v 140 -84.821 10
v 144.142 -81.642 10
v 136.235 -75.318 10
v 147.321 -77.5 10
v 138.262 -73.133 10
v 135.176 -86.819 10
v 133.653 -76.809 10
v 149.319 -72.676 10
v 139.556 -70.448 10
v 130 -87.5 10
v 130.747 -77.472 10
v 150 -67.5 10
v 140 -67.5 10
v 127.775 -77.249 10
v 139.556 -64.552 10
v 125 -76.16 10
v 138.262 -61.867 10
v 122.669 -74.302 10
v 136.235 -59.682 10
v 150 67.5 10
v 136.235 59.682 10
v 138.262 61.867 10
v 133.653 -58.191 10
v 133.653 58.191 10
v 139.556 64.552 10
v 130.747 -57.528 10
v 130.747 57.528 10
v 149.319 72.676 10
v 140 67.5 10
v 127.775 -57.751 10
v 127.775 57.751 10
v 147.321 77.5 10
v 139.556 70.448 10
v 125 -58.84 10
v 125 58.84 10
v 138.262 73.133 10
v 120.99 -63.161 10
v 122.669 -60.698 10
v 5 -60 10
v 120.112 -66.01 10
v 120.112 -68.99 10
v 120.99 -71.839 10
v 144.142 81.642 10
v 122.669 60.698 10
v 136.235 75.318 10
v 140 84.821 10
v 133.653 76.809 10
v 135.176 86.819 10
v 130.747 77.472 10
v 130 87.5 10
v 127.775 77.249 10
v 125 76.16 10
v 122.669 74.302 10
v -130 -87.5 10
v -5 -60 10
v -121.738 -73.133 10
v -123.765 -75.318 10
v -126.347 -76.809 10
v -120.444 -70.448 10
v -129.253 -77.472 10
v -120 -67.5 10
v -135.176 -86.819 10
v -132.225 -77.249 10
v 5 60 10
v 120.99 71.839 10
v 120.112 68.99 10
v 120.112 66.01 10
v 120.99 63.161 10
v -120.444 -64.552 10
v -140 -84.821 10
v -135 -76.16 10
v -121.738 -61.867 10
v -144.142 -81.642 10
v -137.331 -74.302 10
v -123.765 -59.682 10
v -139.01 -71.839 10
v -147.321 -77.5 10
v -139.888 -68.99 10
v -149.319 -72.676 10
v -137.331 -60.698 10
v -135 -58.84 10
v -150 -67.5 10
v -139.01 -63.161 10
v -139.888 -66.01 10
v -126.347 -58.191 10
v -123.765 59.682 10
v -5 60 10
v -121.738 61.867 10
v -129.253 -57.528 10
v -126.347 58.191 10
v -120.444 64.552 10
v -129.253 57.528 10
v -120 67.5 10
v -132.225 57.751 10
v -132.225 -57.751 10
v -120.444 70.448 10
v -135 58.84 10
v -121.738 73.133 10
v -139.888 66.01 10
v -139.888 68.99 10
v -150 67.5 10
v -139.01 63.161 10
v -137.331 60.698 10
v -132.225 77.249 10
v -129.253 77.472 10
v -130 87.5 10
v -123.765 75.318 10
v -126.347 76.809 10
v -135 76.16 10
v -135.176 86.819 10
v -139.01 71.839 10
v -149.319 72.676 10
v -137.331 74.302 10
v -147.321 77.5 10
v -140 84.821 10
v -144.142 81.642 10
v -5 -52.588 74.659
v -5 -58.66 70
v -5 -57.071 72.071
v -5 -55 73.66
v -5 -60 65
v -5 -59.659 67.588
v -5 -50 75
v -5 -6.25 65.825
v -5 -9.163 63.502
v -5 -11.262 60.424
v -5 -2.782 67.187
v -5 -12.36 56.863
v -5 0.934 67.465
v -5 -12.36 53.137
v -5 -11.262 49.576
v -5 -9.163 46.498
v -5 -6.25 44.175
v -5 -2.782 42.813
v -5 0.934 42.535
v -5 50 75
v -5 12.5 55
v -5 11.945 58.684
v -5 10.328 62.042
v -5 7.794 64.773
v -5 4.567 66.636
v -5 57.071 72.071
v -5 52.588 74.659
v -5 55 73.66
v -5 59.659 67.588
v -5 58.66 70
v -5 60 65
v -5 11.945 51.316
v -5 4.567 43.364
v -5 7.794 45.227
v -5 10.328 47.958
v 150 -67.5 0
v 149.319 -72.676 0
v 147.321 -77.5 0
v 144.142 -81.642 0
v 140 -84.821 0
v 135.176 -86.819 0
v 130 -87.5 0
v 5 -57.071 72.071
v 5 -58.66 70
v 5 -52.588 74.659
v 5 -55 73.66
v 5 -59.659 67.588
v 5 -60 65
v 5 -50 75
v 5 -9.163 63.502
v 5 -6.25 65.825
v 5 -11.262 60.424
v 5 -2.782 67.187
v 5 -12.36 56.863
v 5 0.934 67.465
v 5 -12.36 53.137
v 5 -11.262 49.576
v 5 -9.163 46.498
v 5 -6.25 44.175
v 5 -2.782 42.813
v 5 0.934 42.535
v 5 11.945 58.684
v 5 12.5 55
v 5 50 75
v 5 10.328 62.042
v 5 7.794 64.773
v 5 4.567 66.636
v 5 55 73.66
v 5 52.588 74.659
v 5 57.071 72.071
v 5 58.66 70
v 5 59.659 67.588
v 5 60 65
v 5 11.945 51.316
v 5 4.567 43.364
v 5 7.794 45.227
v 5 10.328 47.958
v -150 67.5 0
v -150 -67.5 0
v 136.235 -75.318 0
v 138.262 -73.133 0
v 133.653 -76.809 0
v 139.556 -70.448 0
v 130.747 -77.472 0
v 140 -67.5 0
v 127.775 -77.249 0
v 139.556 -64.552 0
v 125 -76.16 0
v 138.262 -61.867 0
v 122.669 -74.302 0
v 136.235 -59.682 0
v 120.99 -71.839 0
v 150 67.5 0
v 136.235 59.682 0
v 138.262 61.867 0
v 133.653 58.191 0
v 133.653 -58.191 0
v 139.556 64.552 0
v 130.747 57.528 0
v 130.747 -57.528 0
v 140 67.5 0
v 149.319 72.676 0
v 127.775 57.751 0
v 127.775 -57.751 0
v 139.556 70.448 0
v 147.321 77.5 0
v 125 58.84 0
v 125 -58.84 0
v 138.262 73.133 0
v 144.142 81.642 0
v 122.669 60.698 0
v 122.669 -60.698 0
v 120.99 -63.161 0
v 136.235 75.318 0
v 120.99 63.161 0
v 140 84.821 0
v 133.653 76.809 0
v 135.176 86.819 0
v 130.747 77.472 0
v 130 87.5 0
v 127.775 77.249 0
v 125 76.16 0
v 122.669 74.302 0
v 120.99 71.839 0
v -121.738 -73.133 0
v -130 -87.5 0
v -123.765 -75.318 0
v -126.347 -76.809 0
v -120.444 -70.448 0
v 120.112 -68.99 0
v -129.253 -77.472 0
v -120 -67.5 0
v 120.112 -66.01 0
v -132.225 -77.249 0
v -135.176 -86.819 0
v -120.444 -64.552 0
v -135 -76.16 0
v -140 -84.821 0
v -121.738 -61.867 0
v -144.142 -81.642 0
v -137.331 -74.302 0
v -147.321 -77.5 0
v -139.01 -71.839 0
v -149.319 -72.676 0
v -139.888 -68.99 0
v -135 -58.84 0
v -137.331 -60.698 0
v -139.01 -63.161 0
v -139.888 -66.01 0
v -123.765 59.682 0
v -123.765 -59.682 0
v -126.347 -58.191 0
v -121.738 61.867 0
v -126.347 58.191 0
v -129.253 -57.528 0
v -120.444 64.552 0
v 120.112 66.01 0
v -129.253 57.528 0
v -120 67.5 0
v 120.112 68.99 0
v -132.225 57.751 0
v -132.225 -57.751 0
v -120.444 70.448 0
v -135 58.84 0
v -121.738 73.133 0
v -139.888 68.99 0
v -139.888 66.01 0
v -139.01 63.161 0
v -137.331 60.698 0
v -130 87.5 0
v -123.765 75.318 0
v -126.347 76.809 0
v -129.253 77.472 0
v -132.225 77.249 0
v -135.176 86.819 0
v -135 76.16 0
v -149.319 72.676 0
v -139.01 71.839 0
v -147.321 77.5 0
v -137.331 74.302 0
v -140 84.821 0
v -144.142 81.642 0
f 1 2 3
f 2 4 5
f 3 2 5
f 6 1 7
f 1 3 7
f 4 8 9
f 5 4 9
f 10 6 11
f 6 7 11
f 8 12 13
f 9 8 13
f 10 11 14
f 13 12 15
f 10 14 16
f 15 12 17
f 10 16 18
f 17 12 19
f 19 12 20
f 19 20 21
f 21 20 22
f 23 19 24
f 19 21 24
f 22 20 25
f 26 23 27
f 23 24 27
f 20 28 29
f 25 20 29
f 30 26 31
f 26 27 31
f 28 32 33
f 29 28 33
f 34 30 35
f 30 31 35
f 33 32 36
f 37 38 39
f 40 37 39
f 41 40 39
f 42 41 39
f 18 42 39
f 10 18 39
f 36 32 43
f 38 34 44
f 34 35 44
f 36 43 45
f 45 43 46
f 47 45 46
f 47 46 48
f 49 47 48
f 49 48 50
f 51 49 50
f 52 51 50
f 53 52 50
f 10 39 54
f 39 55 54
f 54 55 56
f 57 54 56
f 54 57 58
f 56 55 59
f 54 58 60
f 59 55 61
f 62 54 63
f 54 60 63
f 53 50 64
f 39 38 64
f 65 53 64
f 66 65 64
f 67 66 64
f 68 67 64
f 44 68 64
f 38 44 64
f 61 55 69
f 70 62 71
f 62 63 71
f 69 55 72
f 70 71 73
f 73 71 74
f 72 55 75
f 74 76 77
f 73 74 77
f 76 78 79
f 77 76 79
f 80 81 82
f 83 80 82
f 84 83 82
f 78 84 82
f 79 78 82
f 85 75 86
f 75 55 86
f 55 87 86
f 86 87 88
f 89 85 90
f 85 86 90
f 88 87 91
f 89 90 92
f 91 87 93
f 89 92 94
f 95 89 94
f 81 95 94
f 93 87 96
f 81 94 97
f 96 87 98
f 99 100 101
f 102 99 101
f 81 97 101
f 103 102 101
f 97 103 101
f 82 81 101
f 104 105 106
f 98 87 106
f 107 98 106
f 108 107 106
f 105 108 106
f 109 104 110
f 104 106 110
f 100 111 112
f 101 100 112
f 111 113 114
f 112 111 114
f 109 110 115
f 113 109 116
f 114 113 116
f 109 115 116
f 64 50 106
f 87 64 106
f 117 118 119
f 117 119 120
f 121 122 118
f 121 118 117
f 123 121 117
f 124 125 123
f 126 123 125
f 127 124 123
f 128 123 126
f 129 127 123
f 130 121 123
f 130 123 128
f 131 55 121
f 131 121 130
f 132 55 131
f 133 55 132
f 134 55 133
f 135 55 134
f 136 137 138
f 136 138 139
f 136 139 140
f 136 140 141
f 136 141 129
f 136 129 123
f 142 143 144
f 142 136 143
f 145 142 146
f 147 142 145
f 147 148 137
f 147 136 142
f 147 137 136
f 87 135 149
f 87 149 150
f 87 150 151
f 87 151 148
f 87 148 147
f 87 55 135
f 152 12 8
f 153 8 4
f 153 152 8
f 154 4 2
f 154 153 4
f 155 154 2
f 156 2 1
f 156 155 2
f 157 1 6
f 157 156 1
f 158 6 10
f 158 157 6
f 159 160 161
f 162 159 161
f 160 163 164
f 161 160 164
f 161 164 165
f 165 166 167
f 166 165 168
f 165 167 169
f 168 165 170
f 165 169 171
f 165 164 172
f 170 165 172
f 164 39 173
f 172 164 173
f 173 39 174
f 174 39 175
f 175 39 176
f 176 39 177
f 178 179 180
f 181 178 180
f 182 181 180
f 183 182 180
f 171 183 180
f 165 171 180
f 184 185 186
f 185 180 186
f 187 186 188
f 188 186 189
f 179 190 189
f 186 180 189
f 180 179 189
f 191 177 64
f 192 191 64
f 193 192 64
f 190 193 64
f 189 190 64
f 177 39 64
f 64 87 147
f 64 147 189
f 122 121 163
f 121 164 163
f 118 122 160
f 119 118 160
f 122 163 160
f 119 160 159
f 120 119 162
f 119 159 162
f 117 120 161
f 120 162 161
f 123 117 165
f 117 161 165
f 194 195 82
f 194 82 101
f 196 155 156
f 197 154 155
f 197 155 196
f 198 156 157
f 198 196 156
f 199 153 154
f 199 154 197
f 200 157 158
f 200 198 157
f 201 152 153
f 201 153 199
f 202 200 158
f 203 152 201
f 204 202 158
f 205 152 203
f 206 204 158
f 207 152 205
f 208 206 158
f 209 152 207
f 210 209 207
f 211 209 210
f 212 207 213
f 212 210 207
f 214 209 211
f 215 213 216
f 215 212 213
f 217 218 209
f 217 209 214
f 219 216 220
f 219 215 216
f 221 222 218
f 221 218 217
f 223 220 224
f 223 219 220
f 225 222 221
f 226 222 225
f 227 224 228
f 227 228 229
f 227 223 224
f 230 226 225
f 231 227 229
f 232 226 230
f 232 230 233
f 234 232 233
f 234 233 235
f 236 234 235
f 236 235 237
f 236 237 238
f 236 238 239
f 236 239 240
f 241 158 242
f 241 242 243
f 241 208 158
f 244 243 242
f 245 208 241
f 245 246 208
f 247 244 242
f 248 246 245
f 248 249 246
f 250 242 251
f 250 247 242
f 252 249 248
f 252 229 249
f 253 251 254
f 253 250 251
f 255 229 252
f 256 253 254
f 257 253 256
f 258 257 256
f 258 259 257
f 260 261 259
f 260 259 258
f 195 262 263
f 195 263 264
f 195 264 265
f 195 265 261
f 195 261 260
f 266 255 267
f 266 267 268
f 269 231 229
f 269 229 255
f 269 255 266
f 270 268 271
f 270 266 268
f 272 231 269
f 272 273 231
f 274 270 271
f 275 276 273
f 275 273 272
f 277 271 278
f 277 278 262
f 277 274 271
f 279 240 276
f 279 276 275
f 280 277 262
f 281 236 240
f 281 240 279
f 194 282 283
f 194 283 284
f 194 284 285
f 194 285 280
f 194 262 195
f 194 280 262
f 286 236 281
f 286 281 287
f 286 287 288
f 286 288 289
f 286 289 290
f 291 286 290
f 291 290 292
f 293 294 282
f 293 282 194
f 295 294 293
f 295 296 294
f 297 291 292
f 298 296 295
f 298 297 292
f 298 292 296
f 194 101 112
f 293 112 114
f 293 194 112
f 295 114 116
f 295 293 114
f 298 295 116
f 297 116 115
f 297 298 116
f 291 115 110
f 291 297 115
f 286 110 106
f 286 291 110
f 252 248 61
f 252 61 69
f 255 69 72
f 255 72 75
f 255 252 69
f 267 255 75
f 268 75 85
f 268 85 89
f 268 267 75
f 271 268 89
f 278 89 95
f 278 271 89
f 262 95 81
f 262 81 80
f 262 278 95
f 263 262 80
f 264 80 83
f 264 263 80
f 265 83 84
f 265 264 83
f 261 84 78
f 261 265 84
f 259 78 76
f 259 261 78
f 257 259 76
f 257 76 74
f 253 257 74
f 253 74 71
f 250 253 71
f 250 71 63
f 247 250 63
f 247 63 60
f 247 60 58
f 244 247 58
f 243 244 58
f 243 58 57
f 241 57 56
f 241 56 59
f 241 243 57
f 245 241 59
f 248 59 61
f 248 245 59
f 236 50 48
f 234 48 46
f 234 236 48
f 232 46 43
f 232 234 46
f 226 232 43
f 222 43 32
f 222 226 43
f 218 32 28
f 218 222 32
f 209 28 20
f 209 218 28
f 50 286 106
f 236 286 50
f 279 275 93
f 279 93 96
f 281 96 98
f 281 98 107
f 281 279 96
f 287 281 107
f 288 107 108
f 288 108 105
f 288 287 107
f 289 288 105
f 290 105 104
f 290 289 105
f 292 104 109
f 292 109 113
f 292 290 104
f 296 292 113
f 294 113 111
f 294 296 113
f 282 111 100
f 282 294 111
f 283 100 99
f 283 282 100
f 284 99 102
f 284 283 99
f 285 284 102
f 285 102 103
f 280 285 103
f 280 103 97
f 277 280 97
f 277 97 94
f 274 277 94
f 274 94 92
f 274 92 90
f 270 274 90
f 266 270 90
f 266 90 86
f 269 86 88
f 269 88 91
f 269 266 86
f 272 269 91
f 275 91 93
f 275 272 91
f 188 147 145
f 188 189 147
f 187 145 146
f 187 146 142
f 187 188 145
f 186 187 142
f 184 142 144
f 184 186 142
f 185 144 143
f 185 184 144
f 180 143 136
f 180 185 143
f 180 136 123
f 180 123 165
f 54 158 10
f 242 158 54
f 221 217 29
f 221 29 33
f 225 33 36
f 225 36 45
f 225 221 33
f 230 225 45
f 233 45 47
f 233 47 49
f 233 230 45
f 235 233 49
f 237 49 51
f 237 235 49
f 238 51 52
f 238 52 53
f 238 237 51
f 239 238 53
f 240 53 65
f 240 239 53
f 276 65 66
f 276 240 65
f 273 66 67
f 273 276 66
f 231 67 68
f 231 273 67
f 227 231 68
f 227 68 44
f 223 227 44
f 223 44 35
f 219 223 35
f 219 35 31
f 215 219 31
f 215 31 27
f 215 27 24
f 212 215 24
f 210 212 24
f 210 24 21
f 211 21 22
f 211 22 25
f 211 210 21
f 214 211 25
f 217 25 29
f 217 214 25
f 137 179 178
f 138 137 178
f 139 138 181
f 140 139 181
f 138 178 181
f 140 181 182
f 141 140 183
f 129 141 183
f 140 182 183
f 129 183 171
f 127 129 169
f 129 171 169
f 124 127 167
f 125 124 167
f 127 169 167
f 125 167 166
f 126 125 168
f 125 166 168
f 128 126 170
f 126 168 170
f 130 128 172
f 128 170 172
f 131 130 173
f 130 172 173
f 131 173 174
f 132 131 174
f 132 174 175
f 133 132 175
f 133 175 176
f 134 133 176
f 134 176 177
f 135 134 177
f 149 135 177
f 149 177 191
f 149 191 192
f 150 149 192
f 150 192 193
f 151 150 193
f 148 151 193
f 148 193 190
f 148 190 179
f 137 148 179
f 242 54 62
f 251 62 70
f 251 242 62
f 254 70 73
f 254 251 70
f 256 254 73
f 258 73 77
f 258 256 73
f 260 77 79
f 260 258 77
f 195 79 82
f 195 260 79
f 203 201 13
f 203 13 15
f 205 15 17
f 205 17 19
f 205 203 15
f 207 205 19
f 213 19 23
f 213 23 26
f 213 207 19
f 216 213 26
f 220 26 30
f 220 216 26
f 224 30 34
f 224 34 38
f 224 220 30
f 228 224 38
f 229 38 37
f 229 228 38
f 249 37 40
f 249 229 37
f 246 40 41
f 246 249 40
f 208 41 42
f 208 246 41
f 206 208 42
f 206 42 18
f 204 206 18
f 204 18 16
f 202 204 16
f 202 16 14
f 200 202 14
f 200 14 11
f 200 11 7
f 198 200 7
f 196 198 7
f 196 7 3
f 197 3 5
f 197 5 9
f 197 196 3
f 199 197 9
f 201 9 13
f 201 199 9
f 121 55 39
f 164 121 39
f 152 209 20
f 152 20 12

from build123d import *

# Parameters (mm, degrees)
SZKIC1_R                    = 10
DODANIE_WYCI_GNI_CIE1_DEPTH = 10
SZKIC2_W                    = 10
SZKIC2_H                    = 120
DODANIE_WYCI_GNI_CIE2_DEPTH = 65
ZAOKR_GLENIE1_R             = 10
SZKIC4_R                    = 12.5
WYTNIJ_WYCI_GNI_CIE1_DEPTH  = 65


with BuildPart() as part:
    # Szkic1 → Dodanie-wyciągnięcie1 (new body)
    with BuildSketch(Plane.XY):
        with BuildLine():
            Line((-130, 87.5), (130, 87.5))
            ThreePointArc((130, 87.5), (144.142135624, 81.642135624), (150, 67.5))
            Line((150, 67.5), (150, -67.5))
            ThreePointArc((150, -67.5), (144.142135624, -81.642135624), (130, -87.5))
            Line((130, -87.5), (-130, -87.5))
            ThreePointArc((-130, -87.5), (-144.142135624, -81.642135624), (-150, -67.5))
            Line((-150, -67.5), (-150, 67.5))
            ThreePointArc((-150, 67.5), (-144.142135624, 81.642135624), (-130, 87.5))
        make_face()
        with Locations((-130, 67.5)):
            Circle(SZKIC1_R, mode=Mode.SUBTRACT)
        with Locations((-130, -67.5)):
            Circle(SZKIC1_R, mode=Mode.SUBTRACT)
        with Locations((130, -67.5)):
            Circle(SZKIC1_R, mode=Mode.SUBTRACT)
        with Locations((130, 67.5)):
            Circle(SZKIC1_R, mode=Mode.SUBTRACT)
    extrude(amount=DODANIE_WYCI_GNI_CIE1_DEPTH)

    # Szkic2 → Dodanie-wyciągnięcie2 (add)
    with BuildSketch(Plane.XY.offset(10)):
        Rectangle(SZKIC2_W, SZKIC2_H)
    extrude(amount=DODANIE_WYCI_GNI_CIE2_DEPTH)

    # Zaokrąglenie1
    zaokr_glenie1_edges = [part.edges().sort_by_distance(p)[0] for p in [
        (0, 60, 75),
        (0, -60, 75),
    ]]
    fillet(zaokr_glenie1_edges, radius=ZAOKR_GLENIE1_R)

    # Szkic4 → Wytnij-wyciągnięcie1 (cut)
    with BuildSketch(Plane(origin=(5, 0, 0), x_dir=(0, 0, -1), z_dir=(1, 0, 0))):
        with Locations(Location((-55, 0, 0), (0, 0, 90))):
            Circle(SZKIC4_R)
    extrude(amount=-WYTNIJ_WYCI_GNI_CIE1_DEPTH, mode=Mode.SUBTRACT)


solid = part.part
